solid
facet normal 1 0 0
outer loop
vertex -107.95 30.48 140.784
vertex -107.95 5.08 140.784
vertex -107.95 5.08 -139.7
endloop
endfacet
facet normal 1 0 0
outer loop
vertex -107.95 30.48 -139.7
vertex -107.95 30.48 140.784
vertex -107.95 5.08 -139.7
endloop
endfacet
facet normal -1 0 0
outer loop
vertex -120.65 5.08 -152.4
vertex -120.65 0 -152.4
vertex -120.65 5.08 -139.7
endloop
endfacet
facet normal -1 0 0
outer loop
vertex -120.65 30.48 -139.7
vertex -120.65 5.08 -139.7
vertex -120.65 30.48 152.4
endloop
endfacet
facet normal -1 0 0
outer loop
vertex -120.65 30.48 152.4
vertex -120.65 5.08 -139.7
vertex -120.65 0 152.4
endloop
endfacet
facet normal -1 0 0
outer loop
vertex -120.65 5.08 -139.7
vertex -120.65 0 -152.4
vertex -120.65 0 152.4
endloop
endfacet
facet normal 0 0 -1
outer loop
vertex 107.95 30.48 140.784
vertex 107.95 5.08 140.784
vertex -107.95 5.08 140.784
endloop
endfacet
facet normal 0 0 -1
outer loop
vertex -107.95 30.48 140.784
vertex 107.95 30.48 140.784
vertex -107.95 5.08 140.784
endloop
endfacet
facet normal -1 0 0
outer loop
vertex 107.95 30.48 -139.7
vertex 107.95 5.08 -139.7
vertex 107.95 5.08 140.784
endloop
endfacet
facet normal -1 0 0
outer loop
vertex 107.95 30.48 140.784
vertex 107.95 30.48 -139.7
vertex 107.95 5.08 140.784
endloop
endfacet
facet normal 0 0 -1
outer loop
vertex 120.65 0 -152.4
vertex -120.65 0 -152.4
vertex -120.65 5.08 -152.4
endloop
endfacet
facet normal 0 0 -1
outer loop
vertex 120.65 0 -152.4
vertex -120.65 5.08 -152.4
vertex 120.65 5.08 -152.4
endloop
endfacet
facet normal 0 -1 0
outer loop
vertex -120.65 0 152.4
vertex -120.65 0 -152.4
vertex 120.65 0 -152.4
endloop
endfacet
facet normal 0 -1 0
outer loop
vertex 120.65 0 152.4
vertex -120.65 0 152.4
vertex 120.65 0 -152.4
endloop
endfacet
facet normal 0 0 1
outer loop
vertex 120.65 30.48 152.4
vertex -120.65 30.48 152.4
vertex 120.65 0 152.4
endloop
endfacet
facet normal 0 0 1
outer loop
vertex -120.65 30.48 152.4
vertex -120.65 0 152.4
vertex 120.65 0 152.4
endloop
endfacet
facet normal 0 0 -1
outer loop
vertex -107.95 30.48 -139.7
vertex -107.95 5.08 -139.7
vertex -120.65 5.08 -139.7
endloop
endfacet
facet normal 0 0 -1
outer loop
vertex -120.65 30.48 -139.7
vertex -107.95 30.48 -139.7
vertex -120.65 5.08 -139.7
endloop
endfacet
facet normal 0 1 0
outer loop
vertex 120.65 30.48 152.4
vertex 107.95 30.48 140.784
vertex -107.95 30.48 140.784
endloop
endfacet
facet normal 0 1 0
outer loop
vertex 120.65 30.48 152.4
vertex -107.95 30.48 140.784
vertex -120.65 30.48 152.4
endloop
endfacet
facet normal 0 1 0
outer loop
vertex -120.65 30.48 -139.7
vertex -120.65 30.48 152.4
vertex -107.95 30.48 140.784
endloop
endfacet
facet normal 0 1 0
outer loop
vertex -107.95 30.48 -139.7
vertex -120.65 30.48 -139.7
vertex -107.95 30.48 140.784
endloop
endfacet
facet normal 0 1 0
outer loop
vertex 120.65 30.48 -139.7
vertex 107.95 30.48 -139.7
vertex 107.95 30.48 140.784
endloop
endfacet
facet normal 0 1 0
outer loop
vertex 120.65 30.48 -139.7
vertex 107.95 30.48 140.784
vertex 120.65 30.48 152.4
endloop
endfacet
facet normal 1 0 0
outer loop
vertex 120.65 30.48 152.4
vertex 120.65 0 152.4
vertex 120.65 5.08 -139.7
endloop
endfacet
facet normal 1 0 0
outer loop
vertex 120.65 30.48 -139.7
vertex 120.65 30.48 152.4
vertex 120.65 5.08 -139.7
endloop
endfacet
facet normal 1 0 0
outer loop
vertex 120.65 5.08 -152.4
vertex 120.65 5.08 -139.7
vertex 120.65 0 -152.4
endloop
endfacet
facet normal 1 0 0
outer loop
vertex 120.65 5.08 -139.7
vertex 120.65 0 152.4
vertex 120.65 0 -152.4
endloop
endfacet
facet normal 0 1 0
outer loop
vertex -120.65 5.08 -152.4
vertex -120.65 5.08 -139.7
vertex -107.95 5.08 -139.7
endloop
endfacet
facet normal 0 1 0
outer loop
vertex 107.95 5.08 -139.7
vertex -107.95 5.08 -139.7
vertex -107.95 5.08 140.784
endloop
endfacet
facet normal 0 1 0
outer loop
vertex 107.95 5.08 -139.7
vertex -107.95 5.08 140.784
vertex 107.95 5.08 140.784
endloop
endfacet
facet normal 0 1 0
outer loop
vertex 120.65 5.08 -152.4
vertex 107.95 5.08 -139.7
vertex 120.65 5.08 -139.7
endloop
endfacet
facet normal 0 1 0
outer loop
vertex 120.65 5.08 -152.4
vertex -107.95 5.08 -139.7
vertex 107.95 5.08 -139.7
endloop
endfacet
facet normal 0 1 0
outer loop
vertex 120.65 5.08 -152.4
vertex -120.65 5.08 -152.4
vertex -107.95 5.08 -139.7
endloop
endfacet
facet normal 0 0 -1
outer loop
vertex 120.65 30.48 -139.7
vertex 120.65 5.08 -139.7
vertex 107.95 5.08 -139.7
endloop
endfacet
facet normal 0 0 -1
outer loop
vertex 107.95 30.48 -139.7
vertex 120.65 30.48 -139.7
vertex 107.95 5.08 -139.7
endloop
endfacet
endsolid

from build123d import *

# Parameters (mm, degrees)
SKETCH1_W           = 241.3
SKETCH1_H           = 304.8
SKETCH1_W_2         = 215.9
SKETCH1_H_2         = 279.4
BOSS_EXTRUDE1_DEPTH = 5.08
BOSS_EXTRUDE2_DEPTH = 25.4


with BuildPart() as part:
    # Sketch1 → Boss-Extrude1 (new body)
    with BuildSketch(Plane(origin=(0, 0, 0), x_dir=(1, 0, 0), z_dir=(0, 1, 0))):
        Rectangle(SKETCH1_W, SKETCH1_H)
        Rectangle(SKETCH1_W_2, SKETCH1_H_2, mode=Mode.SUBTRACT)
        Rectangle(SKETCH1_W_2, SKETCH1_H_2)
    extrude(amount=BOSS_EXTRUDE1_DEPTH)

    # Sketch2 → Boss-Extrude2 (add)
    with BuildSketch(Plane(origin=(0, 5.08, 0), x_dir=(1, 0, 0), z_dir=(0, 1, 0))):
        Polygon((-107.95, 139.7), (-120.65, 139.7), (-120.65, -152.4), (120.65, -152.4), (120.65, 139.7), (107.95, 139.7), (107.95, -140.783695347), (-107.95, -140.783695347), align=None)
    extrude(amount=BOSS_EXTRUDE2_DEPTH)


solid = part.part
